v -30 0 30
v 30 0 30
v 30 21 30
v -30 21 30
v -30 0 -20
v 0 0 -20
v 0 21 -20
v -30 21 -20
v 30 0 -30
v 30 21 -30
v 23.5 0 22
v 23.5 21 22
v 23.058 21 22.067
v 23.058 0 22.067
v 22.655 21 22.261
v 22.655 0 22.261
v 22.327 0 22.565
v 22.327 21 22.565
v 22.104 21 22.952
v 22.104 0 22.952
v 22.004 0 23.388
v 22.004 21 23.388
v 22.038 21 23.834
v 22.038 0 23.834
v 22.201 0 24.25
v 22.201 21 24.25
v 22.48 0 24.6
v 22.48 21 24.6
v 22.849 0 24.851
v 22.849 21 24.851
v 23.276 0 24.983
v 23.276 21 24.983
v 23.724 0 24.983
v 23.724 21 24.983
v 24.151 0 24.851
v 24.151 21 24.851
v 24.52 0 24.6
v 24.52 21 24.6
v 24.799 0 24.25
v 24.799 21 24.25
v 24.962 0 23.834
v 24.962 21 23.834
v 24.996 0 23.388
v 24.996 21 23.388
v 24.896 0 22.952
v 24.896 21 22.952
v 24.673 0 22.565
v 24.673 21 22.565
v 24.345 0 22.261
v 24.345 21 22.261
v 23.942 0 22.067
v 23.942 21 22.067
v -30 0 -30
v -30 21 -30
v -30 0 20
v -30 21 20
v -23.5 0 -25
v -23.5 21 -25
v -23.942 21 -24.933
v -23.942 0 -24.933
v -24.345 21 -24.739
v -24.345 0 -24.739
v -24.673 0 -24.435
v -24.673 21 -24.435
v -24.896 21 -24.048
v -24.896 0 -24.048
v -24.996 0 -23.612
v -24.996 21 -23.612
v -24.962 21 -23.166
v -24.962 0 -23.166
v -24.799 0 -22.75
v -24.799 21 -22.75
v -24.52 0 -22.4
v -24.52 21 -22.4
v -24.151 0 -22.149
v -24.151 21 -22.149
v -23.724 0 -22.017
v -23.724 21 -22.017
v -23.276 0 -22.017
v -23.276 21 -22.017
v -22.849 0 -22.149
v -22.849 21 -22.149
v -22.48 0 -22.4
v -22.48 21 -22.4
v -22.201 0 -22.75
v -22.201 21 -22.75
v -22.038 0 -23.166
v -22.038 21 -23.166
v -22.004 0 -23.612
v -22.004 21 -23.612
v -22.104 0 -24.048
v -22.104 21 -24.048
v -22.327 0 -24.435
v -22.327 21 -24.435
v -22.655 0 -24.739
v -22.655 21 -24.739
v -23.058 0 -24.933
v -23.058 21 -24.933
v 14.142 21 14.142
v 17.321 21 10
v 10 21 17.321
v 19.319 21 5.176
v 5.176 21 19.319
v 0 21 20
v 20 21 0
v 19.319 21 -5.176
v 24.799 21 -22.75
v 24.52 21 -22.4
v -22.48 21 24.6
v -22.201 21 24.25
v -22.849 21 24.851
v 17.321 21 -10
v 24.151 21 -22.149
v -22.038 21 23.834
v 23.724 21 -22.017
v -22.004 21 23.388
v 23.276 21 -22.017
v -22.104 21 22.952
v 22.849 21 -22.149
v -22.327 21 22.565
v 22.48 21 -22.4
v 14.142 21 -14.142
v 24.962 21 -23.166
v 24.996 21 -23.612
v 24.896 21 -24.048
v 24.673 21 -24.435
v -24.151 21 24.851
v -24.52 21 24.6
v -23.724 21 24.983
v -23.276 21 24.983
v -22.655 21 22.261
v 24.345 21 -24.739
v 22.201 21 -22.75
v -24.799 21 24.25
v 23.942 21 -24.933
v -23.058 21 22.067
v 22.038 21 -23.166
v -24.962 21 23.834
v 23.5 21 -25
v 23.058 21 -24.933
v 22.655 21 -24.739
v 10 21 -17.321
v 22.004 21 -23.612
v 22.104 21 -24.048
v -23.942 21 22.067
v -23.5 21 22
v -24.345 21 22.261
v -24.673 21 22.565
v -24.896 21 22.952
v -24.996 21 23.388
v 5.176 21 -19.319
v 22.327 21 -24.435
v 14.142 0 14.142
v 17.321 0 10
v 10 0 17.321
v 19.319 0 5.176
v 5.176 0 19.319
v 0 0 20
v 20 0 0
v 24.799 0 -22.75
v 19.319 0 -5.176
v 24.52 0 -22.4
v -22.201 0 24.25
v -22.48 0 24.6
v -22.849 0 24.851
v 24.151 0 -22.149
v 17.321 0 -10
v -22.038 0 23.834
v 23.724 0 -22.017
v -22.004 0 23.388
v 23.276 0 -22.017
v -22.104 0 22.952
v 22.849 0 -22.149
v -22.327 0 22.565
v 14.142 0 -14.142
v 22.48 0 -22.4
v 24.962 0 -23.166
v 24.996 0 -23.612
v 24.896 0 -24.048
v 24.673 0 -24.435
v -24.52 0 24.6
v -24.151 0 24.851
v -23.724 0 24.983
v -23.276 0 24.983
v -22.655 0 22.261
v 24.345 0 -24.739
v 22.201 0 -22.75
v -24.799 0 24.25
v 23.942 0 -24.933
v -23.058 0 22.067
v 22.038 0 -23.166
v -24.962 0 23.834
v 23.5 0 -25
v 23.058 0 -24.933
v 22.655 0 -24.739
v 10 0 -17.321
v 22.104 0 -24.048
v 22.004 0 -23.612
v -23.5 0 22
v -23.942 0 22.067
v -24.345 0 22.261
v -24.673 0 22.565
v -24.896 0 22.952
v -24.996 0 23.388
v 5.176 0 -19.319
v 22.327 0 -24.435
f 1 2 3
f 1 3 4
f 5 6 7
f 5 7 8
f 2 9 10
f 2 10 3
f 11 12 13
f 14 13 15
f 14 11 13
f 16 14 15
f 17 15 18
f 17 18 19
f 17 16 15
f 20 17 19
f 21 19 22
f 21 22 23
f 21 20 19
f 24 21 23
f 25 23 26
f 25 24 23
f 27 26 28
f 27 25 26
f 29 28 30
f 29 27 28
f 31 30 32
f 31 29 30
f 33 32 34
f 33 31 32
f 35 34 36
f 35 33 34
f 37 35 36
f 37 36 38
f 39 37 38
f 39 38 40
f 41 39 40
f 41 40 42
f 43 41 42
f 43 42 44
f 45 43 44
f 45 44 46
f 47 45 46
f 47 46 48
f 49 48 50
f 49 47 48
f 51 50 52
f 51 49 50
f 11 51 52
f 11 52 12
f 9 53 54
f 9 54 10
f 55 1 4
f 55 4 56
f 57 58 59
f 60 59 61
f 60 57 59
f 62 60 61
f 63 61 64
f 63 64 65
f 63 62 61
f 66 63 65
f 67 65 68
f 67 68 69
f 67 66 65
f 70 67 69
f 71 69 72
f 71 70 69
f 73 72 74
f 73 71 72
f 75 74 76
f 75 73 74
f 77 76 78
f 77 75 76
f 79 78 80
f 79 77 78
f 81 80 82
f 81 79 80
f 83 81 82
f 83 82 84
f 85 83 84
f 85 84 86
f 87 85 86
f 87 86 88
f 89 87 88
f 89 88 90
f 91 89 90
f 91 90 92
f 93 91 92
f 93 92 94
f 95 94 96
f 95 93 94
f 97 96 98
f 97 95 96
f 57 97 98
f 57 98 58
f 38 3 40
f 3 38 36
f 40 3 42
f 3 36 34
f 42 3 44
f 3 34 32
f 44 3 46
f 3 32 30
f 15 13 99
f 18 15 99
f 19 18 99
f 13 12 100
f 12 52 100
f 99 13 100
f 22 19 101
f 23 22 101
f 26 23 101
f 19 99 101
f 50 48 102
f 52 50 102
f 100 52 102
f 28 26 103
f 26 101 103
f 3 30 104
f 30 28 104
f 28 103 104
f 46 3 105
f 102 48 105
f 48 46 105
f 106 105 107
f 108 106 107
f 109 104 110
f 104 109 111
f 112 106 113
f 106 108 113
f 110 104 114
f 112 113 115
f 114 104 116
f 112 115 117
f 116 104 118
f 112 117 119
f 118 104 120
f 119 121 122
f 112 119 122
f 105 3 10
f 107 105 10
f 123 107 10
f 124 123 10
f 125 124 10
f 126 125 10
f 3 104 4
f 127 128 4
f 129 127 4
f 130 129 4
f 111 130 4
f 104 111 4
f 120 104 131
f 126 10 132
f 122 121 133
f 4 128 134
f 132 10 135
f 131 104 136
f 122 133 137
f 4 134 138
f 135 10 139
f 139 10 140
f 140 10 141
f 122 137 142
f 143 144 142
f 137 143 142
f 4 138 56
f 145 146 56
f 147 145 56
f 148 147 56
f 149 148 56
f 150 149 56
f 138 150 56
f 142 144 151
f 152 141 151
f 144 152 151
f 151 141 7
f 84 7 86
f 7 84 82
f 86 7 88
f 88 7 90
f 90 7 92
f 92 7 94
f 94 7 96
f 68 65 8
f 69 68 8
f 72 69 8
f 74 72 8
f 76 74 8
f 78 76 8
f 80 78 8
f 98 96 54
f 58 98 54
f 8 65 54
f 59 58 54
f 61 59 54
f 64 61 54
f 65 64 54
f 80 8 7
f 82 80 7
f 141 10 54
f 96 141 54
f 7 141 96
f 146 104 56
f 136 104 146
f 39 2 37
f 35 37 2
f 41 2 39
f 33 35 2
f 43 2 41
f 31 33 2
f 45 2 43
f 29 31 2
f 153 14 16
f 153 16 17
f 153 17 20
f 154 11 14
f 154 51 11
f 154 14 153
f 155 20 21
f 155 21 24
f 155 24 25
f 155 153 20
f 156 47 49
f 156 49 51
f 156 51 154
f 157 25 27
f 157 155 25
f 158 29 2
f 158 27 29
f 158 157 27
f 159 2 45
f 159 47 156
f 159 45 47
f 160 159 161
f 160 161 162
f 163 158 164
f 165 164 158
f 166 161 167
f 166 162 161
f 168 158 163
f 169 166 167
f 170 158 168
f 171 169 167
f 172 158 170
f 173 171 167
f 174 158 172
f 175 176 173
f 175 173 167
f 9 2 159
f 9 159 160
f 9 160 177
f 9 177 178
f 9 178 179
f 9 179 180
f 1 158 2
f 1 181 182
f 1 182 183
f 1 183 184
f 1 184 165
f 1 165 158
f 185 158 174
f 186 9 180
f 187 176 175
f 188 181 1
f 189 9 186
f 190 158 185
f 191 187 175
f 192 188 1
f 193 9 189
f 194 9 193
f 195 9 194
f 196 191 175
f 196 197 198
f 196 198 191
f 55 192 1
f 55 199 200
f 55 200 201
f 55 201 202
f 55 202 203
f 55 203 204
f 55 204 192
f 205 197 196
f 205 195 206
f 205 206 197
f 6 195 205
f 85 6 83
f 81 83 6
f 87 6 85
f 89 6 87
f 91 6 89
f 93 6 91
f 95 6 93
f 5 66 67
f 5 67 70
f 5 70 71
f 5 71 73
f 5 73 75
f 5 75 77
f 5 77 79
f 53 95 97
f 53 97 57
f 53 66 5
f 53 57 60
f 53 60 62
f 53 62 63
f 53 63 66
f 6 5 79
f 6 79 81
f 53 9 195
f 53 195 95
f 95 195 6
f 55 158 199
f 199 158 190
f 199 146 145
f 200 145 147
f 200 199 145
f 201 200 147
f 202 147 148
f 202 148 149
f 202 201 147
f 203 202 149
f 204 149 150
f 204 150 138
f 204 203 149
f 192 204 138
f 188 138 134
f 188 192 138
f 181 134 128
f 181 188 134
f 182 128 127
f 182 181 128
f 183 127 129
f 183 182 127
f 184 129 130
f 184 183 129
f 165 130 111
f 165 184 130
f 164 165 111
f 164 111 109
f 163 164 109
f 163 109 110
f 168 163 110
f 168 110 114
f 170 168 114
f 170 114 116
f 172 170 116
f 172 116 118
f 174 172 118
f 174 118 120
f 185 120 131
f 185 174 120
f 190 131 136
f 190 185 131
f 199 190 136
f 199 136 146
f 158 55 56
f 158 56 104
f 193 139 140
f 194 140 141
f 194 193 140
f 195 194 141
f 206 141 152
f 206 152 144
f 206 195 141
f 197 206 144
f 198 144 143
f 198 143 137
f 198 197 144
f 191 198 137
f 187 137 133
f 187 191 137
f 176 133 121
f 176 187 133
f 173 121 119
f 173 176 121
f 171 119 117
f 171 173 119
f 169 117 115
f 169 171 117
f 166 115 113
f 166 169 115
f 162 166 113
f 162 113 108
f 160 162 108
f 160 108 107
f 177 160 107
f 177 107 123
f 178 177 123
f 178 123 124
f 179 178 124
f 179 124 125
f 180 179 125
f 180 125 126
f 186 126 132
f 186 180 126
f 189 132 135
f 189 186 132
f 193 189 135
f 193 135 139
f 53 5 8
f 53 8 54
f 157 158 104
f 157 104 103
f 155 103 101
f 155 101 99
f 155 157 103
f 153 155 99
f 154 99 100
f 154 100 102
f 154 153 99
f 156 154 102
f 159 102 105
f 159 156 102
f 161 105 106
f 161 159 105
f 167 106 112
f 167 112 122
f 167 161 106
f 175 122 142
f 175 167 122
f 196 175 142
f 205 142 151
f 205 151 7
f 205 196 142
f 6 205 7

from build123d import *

# Parameters (mm, degrees)
SKETCH1_R           = 1.5
BOSS_EXTRUDE1_DEPTH = 21


with BuildPart() as part:
    # Sketch1 → Boss-Extrude1 (new body)
    with BuildSketch(Plane(origin=(0, 0, 0), x_dir=(1, 0, 0), z_dir=(0, 1, 0))):
        with BuildLine():
            Line((0, 20), (-30, 20))
            Line((-30, 20), (-30, 30))
            Line((-30, 30), (30, 30))
            Line((30, 30), (30, -30))
            Line((30, -30), (-30, -30))
            Line((-30, -30), (-30, -20))
            Line((-30, -20), (0, -20))
            ThreePointArc((0, -20), (20, 0), (0, 20))
        make_face()
        with Locations(Location((-23.5, 23.5, 0), (0, 0, 90))):
            Circle(SKETCH1_R, mode=Mode.SUBTRACT)
        with Locations(Location((23.5, 23.5, 0), (0, 0, 90))):
            Circle(SKETCH1_R, mode=Mode.SUBTRACT)
        with Locations(Location((-23.5, -23.5, 0), (0, 0, 90))):
            Circle(SKETCH1_R, mode=Mode.SUBTRACT)
        with Locations(Location((23.5, -23.5, 0), (0, 0, 90))):
            Circle(SKETCH1_R, mode=Mode.SUBTRACT)
    extrude(amount=BOSS_EXTRUDE1_DEPTH)


solid = part.part
